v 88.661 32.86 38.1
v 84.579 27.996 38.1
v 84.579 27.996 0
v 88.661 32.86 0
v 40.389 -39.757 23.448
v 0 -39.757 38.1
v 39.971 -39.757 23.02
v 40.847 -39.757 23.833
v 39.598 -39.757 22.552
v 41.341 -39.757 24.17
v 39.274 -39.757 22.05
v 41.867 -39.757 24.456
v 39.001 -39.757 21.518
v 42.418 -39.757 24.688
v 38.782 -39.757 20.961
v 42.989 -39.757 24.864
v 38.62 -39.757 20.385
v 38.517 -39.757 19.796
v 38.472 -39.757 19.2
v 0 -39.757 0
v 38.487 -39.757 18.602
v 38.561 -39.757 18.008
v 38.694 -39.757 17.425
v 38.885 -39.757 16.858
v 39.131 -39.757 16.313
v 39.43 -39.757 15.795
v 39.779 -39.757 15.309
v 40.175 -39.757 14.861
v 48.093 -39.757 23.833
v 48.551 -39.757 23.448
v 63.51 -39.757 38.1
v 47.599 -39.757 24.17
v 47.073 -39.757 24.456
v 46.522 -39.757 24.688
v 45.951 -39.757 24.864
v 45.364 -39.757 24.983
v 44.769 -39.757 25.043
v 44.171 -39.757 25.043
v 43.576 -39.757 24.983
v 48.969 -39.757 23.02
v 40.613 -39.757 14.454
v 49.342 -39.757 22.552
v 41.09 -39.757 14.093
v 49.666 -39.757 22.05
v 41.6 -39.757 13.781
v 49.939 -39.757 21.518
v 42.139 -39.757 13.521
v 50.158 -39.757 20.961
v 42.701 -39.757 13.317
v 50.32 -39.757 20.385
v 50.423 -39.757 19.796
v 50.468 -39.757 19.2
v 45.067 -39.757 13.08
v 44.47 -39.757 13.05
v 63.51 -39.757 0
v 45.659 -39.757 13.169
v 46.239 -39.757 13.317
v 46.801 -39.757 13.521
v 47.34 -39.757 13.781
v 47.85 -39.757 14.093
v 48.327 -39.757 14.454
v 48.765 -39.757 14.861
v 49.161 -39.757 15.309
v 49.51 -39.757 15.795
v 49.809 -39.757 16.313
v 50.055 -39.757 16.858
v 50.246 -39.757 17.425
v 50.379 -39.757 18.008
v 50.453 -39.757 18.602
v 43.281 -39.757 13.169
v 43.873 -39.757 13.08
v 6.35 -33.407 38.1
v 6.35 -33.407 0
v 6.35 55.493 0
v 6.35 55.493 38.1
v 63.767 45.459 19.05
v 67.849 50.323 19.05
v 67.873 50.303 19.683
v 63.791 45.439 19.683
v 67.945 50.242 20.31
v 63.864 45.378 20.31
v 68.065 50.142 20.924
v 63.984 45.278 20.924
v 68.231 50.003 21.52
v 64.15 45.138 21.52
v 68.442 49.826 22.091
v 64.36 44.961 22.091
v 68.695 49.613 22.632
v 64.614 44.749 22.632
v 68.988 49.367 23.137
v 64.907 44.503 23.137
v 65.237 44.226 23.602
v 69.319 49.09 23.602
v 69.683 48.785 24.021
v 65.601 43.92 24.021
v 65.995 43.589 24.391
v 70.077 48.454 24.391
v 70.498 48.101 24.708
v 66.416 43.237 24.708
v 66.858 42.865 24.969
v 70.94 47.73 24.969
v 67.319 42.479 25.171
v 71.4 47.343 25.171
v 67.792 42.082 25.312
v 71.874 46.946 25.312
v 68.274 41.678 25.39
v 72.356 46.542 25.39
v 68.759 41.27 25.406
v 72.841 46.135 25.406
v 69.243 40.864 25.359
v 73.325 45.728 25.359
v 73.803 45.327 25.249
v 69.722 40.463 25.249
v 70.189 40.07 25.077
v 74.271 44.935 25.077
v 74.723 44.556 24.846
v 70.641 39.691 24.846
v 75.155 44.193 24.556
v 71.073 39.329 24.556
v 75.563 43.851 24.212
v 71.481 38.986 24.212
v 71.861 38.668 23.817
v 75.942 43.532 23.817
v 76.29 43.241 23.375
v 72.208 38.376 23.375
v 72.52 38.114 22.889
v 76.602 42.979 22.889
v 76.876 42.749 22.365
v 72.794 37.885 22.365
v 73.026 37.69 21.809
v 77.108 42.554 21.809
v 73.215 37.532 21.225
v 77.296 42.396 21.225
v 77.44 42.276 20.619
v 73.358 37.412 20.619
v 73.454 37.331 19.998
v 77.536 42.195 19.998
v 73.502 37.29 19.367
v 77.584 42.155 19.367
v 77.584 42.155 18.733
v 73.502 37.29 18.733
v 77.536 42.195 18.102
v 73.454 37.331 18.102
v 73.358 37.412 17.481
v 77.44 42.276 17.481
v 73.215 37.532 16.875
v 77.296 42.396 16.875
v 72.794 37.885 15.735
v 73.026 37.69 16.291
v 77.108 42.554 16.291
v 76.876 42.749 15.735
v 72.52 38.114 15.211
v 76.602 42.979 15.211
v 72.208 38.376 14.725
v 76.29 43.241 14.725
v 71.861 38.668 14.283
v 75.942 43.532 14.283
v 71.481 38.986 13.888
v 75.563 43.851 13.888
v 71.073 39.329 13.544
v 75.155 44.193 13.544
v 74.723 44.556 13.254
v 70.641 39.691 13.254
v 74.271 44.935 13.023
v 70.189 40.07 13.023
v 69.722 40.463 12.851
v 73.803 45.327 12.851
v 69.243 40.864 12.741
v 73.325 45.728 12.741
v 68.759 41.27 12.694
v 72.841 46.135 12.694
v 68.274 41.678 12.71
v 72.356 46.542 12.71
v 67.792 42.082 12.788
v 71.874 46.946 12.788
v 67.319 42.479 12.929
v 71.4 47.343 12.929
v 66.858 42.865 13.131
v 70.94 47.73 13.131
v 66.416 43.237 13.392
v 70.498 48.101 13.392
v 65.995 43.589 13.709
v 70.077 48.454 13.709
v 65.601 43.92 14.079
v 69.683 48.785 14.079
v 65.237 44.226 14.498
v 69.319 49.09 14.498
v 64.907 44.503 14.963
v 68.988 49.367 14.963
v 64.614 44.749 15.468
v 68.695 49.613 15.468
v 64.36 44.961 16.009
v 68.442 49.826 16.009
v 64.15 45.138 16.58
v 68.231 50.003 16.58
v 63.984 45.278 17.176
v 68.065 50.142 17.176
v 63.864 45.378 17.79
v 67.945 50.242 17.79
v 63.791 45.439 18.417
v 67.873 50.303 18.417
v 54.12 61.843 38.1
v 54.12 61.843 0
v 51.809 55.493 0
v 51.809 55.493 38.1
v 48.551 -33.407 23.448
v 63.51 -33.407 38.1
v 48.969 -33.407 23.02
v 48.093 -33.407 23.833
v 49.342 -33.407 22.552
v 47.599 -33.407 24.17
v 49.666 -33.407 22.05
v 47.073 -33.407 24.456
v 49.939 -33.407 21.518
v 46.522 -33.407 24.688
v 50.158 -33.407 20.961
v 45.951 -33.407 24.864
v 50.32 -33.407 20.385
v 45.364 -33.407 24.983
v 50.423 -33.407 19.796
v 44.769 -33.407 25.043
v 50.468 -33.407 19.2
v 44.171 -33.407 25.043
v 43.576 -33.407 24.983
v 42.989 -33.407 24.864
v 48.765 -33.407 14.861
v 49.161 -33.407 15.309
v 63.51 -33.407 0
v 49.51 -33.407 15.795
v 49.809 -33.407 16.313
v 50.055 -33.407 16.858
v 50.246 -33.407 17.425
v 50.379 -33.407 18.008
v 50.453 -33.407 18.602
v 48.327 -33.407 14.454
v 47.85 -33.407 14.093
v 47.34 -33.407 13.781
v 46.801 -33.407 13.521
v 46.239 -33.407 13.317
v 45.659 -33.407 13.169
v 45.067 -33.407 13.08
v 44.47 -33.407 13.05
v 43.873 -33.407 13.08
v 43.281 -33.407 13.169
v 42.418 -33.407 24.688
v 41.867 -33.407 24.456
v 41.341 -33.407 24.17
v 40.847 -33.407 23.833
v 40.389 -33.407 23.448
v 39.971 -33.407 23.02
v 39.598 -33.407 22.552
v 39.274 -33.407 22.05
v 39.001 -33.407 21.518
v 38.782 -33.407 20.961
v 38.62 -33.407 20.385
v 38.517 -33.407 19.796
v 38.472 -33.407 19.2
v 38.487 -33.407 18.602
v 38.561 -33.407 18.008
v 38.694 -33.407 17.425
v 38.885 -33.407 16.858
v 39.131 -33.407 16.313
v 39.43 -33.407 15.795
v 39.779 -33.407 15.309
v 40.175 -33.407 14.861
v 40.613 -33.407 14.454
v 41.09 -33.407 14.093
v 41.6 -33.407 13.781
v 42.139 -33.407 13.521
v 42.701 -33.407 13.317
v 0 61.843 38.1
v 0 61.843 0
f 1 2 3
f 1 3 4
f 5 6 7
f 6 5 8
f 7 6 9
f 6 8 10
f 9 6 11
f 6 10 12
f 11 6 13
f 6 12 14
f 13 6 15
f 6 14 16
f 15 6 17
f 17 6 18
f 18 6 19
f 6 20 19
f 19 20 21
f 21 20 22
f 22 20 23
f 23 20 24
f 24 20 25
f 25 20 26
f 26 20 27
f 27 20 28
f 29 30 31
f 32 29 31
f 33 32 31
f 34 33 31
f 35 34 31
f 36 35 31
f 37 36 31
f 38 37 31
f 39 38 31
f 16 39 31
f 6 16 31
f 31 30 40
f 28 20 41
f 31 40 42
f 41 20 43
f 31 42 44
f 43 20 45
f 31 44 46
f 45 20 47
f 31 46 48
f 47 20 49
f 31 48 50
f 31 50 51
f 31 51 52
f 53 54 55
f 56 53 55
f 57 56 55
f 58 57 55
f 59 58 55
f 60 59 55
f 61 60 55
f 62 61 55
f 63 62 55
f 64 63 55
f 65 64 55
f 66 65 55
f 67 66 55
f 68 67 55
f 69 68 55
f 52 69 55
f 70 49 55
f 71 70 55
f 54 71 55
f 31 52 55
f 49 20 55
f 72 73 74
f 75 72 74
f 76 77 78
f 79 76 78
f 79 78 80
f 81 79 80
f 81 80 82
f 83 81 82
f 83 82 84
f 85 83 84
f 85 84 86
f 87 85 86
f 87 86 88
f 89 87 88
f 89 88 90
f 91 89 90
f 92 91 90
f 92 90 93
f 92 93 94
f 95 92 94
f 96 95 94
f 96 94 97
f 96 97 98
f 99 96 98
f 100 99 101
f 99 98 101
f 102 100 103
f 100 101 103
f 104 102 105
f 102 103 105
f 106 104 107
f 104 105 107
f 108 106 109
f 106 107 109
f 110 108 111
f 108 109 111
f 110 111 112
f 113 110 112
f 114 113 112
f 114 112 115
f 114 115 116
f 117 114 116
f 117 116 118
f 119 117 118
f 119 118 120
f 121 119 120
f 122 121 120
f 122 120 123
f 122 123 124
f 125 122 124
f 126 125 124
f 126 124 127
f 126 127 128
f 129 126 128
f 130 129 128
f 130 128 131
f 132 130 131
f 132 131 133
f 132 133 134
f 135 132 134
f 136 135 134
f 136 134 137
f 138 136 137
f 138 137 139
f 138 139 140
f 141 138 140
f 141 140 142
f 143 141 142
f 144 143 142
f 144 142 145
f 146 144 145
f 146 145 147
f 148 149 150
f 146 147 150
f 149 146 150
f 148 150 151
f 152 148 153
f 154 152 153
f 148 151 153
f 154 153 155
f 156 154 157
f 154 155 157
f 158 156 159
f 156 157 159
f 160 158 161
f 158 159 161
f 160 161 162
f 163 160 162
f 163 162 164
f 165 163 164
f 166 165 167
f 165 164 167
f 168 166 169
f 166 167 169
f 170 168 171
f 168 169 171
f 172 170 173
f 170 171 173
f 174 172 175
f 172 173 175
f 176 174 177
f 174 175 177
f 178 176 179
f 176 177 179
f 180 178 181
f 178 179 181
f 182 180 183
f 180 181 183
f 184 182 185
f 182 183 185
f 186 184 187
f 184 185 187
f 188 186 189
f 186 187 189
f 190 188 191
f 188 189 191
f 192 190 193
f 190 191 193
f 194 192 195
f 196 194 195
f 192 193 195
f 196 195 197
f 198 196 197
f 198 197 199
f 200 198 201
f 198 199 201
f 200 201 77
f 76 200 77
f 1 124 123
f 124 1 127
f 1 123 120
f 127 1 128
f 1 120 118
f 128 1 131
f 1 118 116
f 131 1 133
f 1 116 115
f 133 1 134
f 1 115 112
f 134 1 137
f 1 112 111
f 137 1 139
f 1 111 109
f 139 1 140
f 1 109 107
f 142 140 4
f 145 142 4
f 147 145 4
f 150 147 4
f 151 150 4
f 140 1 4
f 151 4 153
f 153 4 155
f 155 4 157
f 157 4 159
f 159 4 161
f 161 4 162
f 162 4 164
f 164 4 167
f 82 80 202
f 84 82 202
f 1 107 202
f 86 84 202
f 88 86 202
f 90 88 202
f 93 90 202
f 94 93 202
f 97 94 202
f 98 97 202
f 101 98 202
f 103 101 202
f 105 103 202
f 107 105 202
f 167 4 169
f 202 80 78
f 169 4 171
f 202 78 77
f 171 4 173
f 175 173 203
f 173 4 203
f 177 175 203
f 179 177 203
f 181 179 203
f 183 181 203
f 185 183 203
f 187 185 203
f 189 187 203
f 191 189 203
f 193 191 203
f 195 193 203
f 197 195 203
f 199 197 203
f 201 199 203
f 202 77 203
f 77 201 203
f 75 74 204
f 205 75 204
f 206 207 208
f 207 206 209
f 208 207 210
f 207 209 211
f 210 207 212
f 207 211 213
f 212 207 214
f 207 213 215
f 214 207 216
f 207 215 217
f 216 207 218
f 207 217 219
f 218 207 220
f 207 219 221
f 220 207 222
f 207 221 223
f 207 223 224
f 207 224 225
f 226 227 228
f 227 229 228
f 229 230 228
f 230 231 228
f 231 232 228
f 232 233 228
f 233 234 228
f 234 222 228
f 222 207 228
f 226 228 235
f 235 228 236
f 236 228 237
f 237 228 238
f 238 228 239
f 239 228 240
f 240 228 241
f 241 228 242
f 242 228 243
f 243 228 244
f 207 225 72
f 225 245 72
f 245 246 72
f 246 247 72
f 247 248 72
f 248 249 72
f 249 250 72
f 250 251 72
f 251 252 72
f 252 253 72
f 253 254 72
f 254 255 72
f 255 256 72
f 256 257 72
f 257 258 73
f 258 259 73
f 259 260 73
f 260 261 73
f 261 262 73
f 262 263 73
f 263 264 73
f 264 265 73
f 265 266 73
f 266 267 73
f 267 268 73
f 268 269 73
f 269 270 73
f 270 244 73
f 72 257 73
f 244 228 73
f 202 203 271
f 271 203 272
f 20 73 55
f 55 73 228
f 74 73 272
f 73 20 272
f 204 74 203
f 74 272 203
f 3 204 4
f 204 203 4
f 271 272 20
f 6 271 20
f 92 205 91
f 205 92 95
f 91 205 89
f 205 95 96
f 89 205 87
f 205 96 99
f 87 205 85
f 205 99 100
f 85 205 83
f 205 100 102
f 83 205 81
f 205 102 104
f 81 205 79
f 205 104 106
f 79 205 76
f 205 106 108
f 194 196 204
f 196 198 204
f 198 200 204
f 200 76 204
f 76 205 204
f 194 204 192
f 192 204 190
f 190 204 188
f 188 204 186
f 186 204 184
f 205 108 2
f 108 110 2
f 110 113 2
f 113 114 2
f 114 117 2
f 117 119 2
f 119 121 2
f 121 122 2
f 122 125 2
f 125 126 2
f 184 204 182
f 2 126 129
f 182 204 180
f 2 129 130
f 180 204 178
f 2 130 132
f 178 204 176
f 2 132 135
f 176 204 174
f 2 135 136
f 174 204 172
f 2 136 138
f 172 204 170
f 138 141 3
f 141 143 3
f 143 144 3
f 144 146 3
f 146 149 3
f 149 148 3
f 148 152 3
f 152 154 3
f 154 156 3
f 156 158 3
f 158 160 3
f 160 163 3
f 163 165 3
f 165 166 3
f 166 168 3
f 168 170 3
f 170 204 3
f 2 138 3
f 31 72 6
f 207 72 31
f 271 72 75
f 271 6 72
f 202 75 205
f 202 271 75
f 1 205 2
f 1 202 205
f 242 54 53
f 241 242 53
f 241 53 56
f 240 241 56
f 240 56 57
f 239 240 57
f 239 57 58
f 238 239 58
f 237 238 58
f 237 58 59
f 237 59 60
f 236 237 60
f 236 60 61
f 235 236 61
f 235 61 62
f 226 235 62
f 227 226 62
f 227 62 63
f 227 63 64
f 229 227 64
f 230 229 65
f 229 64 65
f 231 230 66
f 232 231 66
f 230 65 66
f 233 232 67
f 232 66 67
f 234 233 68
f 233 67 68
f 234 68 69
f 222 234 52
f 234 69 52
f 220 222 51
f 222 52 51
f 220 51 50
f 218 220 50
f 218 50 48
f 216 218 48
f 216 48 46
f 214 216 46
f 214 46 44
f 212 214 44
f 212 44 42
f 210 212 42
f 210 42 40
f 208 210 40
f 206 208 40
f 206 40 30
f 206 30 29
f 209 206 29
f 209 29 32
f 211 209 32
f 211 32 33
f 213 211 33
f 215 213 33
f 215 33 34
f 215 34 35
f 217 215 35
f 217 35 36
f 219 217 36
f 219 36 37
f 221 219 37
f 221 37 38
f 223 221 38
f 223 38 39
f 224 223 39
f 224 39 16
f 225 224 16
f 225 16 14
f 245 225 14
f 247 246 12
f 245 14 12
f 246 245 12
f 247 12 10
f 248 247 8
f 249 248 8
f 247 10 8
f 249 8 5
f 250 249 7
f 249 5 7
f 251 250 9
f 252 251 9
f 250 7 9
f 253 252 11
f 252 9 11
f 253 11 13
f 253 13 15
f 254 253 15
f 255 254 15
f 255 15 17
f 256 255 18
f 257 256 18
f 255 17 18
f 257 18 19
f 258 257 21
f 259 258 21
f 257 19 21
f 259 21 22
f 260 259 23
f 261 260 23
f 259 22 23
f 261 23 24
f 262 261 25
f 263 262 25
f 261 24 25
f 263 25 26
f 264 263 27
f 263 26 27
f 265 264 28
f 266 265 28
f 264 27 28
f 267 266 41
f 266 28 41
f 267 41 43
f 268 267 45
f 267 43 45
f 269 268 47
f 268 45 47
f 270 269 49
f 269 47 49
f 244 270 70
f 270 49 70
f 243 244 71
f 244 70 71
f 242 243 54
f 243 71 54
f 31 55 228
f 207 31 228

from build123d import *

# Parameters (mm, degrees)
BOSS_EXTRUDE1_DEPTH = 38.1
SKETCH3_R           = 6
CUT_EXTRUDE1_DEPTH  = 23.1
SKETCH4_R           = 6.358205361
CUT_EXTRUDE2_DEPTH  = 23.1


with BuildPart() as part:
    # Sketch2 → Boss-Extrude1 (new body)
    with BuildSketch(Plane.XY):
        Polygon((0, -39.756624631), (63.51, -39.756624631), (63.51, -33.406624631), (6.35, -33.406624631), (6.35, 55.493375369), (51.808789012, 55.493375369), (84.579242619, 27.995699834), (88.66094394, 32.860082048), (54.12, 61.843375369), (0, 61.843375369), align=None)
    extrude(amount=BOSS_EXTRUDE1_DEPTH)

    # Sketch3 → Cut-Extrude1 (cut)
    with BuildSketch(Plane.XZ.offset(39.756624631)):
        with Locations(Location((44.47, 19.05, 0), (0, 0, 270))):
            Circle(SKETCH3_R)
    extrude(amount=-CUT_EXTRUDE1_DEPTH, mode=Mode.SUBTRACT)

    # Sketch4 → Cut-Extrude2 (cut)
    with BuildSketch(Plane(origin=(52.81299808, 62.940080198, 0), x_dir=(0.7660444431189768, -0.6427876096865409, 0), z_dir=(0.6427876096865408, 0.7660444431189767, 0))):
        with Locations(Location((25.986169834, -19.05, 0), (0, 0, 180))):
            Circle(SKETCH4_R)
    extrude(amount=-CUT_EXTRUDE2_DEPTH, mode=Mode.SUBTRACT)


solid = part.part
